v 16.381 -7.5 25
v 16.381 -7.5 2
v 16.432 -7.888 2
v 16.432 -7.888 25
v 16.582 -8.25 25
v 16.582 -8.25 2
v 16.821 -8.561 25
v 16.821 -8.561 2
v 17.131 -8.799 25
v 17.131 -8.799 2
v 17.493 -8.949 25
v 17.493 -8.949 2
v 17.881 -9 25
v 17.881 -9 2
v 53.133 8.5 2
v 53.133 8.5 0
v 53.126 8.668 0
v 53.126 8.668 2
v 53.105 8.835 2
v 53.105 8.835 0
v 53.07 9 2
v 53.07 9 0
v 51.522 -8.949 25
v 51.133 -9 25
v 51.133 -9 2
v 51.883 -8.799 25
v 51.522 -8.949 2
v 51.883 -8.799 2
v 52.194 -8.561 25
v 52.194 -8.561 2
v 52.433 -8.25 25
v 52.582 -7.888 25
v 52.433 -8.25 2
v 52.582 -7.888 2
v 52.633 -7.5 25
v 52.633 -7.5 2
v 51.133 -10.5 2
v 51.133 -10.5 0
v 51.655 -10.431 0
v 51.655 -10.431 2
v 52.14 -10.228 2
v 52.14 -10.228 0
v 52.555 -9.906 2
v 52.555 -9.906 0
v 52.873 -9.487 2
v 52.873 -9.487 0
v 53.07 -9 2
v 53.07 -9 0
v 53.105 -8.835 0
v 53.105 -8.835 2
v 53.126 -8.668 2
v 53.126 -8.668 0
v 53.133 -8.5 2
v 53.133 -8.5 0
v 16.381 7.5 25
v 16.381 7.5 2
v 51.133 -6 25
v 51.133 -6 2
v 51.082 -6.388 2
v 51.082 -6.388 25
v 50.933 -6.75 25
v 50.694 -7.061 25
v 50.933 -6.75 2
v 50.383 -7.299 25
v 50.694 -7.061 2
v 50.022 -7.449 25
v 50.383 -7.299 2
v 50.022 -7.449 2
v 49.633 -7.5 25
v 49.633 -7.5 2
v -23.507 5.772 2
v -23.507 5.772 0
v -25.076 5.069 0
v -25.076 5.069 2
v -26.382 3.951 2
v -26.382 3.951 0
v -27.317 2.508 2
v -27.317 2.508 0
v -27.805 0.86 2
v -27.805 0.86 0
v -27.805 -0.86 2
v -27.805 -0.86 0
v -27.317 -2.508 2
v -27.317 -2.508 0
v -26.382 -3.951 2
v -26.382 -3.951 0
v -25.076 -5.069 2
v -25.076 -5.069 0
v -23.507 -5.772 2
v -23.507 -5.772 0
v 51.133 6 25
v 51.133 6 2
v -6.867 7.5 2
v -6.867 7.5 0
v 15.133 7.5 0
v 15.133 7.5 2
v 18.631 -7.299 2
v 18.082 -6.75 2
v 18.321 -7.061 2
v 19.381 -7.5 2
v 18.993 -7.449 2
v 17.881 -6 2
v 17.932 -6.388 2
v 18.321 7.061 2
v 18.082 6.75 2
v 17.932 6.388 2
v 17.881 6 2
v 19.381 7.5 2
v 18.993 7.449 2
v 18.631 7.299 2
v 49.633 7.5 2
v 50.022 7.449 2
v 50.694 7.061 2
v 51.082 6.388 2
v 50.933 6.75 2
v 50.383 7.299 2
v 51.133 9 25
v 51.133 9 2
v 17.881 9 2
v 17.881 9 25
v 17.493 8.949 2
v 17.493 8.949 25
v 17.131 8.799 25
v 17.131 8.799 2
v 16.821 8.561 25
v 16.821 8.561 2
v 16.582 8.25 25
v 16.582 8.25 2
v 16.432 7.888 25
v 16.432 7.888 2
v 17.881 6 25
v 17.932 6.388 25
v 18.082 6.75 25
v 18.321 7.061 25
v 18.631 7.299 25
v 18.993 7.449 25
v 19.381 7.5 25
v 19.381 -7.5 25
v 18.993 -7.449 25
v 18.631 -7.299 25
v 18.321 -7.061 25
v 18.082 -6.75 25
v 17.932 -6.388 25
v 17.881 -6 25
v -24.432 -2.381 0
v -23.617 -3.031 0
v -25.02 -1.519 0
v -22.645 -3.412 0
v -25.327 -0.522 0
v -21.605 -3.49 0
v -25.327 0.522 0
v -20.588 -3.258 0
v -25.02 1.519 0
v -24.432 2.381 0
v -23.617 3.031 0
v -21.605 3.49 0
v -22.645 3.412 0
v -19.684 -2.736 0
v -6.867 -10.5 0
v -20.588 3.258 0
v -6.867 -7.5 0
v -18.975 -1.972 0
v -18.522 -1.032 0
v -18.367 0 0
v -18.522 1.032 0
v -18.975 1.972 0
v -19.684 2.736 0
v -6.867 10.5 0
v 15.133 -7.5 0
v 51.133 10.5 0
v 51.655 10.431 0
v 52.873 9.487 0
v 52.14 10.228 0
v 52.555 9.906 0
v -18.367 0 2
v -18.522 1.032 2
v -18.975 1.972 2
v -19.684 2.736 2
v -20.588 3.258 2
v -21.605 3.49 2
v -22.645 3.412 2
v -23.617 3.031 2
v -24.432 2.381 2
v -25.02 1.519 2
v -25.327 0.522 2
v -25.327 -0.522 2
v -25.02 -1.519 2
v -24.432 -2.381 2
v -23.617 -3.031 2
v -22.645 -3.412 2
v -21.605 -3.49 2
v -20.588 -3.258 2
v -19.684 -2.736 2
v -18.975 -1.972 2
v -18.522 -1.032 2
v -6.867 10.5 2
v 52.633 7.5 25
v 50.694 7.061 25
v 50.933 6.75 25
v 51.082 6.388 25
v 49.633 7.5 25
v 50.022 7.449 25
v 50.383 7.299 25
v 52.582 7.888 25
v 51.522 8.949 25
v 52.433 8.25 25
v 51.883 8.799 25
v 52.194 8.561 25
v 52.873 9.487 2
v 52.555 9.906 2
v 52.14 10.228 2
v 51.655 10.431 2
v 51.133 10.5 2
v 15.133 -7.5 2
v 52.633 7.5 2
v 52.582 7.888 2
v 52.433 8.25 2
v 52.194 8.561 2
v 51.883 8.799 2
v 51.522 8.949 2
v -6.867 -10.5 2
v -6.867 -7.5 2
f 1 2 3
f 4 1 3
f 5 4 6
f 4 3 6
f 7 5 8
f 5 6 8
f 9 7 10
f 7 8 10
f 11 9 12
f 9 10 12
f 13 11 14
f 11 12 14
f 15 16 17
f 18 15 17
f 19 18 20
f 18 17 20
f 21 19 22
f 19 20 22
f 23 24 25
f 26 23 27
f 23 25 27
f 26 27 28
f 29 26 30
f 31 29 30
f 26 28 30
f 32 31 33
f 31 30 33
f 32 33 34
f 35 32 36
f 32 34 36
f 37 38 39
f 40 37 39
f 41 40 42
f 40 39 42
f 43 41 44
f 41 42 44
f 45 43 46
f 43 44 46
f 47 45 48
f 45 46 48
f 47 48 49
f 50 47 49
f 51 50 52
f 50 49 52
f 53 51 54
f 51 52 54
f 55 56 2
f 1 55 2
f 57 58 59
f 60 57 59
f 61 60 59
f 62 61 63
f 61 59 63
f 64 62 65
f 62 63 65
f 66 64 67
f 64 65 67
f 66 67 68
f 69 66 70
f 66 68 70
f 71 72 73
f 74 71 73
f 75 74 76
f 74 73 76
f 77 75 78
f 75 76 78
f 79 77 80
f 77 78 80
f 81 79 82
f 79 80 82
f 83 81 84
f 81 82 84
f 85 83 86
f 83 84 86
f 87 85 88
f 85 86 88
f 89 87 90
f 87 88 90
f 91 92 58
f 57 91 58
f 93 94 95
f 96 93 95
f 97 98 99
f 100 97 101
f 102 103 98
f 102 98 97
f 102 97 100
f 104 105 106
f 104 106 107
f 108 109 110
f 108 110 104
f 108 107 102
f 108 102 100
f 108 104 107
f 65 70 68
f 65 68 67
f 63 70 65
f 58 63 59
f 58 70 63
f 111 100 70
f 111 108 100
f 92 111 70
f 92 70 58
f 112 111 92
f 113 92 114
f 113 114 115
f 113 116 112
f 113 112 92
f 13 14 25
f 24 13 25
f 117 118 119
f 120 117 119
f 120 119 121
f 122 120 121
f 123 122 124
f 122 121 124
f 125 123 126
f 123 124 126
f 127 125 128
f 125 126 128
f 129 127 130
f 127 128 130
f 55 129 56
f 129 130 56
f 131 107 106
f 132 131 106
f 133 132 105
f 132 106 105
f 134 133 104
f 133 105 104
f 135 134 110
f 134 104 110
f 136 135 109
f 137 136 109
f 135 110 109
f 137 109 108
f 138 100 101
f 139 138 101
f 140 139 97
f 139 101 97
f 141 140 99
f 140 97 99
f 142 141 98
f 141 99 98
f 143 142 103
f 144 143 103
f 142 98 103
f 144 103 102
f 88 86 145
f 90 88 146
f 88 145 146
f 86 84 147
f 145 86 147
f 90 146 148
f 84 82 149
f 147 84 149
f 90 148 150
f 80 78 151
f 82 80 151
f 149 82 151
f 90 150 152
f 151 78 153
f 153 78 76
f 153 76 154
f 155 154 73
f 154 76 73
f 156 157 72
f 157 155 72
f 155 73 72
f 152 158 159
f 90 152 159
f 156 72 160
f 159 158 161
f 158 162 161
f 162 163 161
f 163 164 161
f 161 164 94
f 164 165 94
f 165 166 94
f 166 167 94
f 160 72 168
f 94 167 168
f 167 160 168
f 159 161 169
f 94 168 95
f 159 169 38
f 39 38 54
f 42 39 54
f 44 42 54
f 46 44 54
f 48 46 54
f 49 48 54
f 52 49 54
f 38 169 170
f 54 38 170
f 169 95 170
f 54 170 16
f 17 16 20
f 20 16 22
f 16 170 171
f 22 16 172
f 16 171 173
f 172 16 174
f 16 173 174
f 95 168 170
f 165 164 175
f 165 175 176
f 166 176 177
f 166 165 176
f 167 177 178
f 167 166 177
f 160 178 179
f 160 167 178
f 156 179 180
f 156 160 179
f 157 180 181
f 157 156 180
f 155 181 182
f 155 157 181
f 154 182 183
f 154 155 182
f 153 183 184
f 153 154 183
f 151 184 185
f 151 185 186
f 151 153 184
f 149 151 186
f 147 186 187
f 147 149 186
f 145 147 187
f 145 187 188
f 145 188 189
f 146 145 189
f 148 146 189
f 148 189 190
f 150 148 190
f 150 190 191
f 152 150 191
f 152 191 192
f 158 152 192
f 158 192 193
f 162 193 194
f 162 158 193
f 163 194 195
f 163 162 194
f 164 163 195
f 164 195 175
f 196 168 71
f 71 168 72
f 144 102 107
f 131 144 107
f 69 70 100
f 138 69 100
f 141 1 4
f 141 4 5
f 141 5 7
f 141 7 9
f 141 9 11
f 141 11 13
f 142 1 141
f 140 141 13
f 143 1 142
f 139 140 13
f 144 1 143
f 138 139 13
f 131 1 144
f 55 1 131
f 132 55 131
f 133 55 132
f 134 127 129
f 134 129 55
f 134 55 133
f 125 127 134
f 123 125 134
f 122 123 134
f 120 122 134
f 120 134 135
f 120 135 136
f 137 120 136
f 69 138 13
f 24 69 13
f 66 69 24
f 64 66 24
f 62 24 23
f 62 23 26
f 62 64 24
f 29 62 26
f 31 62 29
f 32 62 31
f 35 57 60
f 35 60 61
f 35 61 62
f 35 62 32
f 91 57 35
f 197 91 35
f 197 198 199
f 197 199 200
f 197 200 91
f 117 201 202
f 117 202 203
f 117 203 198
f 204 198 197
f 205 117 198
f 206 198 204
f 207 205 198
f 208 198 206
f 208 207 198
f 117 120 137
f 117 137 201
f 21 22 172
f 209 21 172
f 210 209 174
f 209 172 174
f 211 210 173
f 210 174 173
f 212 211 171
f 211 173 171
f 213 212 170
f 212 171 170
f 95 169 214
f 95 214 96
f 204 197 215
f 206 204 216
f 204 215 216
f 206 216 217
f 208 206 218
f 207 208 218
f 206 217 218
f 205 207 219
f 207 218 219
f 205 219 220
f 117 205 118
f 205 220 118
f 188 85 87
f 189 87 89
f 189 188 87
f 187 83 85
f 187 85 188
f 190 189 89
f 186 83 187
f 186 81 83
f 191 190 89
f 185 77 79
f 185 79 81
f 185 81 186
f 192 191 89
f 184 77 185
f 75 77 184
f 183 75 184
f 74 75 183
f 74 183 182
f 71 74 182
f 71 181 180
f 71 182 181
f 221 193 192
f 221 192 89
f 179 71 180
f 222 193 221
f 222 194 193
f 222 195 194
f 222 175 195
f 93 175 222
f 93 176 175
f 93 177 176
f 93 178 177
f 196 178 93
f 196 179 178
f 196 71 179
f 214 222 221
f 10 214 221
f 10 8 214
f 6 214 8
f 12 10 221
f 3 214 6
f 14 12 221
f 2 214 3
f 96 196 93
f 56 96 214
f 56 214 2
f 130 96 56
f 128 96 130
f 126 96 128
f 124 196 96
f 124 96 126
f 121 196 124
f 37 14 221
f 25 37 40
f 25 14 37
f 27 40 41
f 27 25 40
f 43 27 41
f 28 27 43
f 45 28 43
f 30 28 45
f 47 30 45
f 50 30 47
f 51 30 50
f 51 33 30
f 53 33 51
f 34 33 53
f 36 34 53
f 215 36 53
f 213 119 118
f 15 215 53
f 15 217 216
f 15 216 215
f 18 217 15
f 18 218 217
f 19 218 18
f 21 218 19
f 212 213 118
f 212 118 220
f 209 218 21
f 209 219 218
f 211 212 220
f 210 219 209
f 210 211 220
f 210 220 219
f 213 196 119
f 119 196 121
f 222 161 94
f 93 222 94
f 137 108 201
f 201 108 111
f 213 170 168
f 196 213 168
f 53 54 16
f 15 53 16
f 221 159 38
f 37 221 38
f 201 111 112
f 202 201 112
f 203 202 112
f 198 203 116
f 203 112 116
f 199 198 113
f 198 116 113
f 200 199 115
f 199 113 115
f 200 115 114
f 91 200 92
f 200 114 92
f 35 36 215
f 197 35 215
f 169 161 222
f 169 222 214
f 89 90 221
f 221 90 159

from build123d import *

# Parameters (mm, degrees)
F0_R     = 3.5
F0_W     = 22
F0_H     = 15
F1_DEPTH = 2
F2_DEPTH = 25
F3_DEPTH = 2


with BuildPart() as f1:
    # F0 (on Top) → F1 (new body)
    with BuildSketch(Plane.XY):
        with BuildLine():
            Line((-23.506553, -5.771502), (-6.866502, -10.5))
            Line((-6.866502, -10.5), (51.133498, -10.5))
            ThreePointArc((51.133498, -10.5), (52.358243, -10.081139), (53.06999, -9))
            ThreePointArc((53.06999, -9), (53.117558, -8.752009), (53.133498, -8.5))
            Line((53.133498, -8.5), (53.133498, 8.5))
            ThreePointArc((53.133498, 8.5), (53.117558, 8.752009), (53.06999, 9))
            ThreePointArc((53.06999, 9), (52.358243, 10.081139), (51.133498, 10.5))
            Line((51.133498, 10.5), (-6.866502, 10.5))
            Line((-6.866502, 10.5), (-23.506553, 5.771502))
            ThreePointArc((-23.506553, 5.771502), (-27.866502, 0), (-23.506553, -5.771502))
        make_face()
        with Locations((-21.866502, 0)):
            Circle(F0_R, mode=Mode.SUBTRACT)
        with Locations((4.133498, 0)):
            Rectangle(F0_W, F0_H, mode=Mode.SUBTRACT)
        with BuildLine():
            ThreePointArc((17.881379, -9), (16.820718, -8.56066), (16.381379, -7.5))
            Line((16.381379, -7.5), (16.381379, 7.5))
            ThreePointArc((16.381379, 7.5), (16.820718, 8.56066), (17.881379, 9))
            Line((17.881379, 9), (51.133498, 9))
            ThreePointArc((51.133498, 9), (52.194158, 8.56066), (52.633498, 7.5))
            Line((52.633498, 7.5), (52.633498, -7.5))
            ThreePointArc((52.633498, -7.5), (52.194158, -8.56066), (51.133498, -9))
            Line((51.133498, -9), (17.881379, -9))
        make_face(mode=Mode.SUBTRACT)
    extrude(amount=F1_DEPTH)

    # F0 (on Top) → F2 (join)
    with BuildSketch(Plane.XY):
        with BuildLine():
            Line((16.381379, 7.5), (16.381379, -7.5))
            ThreePointArc((16.381379, -7.5), (16.820718, -8.56066), (17.881379, -9))
            Line((17.881379, -9), (51.133498, -9))
            ThreePointArc((51.133498, -9), (52.194158, -8.56066), (52.633498, -7.5))
            Line((52.633498, -7.5), (52.633498, 7.5))
            ThreePointArc((52.633498, 7.5), (52.194158, 8.56066), (51.133498, 9))
            Line((51.133498, 9), (17.881379, 9))
            ThreePointArc((17.881379, 9), (16.820718, 8.56066), (16.381379, 7.5))
        make_face()
        with BuildLine():
            Line((49.633498, -7.5), (19.381379, -7.5))
            ThreePointArc((19.381379, -7.5), (18.320718, -7.06066), (17.881379, -6))
            Line((17.881379, -6), (17.881379, 6))
            ThreePointArc((17.881379, 6), (18.320718, 7.06066), (19.381379, 7.5))
            Line((19.381379, 7.5), (49.633498, 7.5))
            ThreePointArc((49.633498, 7.5), (50.694158, 7.06066), (51.133498, 6))
            Line((51.133498, 6), (51.133498, -6))
            ThreePointArc((51.133498, -6), (50.694158, -7.06066), (49.633498, -7.5))
        make_face(mode=Mode.SUBTRACT)
    extrude(amount=F2_DEPTH)

    # F0 (on Top) → F3 (join)
    with BuildSketch(Plane.XY):
        with BuildLine():
            ThreePointArc((17.881379, -6), (18.320718, -7.06066), (19.381379, -7.5))
            Line((19.381379, -7.5), (49.633498, -7.5))
            ThreePointArc((49.633498, -7.5), (50.694158, -7.06066), (51.133498, -6))
            Line((51.133498, -6), (51.133498, 6))
            ThreePointArc((51.133498, 6), (50.694158, 7.06066), (49.633498, 7.5))
            Line((49.633498, 7.5), (19.381379, 7.5))
            ThreePointArc((19.381379, 7.5), (18.320718, 7.06066), (17.881379, 6))
            Line((17.881379, 6), (17.881379, -6))
        make_face()
    extrude(amount=F3_DEPTH)


solid = f1.part
